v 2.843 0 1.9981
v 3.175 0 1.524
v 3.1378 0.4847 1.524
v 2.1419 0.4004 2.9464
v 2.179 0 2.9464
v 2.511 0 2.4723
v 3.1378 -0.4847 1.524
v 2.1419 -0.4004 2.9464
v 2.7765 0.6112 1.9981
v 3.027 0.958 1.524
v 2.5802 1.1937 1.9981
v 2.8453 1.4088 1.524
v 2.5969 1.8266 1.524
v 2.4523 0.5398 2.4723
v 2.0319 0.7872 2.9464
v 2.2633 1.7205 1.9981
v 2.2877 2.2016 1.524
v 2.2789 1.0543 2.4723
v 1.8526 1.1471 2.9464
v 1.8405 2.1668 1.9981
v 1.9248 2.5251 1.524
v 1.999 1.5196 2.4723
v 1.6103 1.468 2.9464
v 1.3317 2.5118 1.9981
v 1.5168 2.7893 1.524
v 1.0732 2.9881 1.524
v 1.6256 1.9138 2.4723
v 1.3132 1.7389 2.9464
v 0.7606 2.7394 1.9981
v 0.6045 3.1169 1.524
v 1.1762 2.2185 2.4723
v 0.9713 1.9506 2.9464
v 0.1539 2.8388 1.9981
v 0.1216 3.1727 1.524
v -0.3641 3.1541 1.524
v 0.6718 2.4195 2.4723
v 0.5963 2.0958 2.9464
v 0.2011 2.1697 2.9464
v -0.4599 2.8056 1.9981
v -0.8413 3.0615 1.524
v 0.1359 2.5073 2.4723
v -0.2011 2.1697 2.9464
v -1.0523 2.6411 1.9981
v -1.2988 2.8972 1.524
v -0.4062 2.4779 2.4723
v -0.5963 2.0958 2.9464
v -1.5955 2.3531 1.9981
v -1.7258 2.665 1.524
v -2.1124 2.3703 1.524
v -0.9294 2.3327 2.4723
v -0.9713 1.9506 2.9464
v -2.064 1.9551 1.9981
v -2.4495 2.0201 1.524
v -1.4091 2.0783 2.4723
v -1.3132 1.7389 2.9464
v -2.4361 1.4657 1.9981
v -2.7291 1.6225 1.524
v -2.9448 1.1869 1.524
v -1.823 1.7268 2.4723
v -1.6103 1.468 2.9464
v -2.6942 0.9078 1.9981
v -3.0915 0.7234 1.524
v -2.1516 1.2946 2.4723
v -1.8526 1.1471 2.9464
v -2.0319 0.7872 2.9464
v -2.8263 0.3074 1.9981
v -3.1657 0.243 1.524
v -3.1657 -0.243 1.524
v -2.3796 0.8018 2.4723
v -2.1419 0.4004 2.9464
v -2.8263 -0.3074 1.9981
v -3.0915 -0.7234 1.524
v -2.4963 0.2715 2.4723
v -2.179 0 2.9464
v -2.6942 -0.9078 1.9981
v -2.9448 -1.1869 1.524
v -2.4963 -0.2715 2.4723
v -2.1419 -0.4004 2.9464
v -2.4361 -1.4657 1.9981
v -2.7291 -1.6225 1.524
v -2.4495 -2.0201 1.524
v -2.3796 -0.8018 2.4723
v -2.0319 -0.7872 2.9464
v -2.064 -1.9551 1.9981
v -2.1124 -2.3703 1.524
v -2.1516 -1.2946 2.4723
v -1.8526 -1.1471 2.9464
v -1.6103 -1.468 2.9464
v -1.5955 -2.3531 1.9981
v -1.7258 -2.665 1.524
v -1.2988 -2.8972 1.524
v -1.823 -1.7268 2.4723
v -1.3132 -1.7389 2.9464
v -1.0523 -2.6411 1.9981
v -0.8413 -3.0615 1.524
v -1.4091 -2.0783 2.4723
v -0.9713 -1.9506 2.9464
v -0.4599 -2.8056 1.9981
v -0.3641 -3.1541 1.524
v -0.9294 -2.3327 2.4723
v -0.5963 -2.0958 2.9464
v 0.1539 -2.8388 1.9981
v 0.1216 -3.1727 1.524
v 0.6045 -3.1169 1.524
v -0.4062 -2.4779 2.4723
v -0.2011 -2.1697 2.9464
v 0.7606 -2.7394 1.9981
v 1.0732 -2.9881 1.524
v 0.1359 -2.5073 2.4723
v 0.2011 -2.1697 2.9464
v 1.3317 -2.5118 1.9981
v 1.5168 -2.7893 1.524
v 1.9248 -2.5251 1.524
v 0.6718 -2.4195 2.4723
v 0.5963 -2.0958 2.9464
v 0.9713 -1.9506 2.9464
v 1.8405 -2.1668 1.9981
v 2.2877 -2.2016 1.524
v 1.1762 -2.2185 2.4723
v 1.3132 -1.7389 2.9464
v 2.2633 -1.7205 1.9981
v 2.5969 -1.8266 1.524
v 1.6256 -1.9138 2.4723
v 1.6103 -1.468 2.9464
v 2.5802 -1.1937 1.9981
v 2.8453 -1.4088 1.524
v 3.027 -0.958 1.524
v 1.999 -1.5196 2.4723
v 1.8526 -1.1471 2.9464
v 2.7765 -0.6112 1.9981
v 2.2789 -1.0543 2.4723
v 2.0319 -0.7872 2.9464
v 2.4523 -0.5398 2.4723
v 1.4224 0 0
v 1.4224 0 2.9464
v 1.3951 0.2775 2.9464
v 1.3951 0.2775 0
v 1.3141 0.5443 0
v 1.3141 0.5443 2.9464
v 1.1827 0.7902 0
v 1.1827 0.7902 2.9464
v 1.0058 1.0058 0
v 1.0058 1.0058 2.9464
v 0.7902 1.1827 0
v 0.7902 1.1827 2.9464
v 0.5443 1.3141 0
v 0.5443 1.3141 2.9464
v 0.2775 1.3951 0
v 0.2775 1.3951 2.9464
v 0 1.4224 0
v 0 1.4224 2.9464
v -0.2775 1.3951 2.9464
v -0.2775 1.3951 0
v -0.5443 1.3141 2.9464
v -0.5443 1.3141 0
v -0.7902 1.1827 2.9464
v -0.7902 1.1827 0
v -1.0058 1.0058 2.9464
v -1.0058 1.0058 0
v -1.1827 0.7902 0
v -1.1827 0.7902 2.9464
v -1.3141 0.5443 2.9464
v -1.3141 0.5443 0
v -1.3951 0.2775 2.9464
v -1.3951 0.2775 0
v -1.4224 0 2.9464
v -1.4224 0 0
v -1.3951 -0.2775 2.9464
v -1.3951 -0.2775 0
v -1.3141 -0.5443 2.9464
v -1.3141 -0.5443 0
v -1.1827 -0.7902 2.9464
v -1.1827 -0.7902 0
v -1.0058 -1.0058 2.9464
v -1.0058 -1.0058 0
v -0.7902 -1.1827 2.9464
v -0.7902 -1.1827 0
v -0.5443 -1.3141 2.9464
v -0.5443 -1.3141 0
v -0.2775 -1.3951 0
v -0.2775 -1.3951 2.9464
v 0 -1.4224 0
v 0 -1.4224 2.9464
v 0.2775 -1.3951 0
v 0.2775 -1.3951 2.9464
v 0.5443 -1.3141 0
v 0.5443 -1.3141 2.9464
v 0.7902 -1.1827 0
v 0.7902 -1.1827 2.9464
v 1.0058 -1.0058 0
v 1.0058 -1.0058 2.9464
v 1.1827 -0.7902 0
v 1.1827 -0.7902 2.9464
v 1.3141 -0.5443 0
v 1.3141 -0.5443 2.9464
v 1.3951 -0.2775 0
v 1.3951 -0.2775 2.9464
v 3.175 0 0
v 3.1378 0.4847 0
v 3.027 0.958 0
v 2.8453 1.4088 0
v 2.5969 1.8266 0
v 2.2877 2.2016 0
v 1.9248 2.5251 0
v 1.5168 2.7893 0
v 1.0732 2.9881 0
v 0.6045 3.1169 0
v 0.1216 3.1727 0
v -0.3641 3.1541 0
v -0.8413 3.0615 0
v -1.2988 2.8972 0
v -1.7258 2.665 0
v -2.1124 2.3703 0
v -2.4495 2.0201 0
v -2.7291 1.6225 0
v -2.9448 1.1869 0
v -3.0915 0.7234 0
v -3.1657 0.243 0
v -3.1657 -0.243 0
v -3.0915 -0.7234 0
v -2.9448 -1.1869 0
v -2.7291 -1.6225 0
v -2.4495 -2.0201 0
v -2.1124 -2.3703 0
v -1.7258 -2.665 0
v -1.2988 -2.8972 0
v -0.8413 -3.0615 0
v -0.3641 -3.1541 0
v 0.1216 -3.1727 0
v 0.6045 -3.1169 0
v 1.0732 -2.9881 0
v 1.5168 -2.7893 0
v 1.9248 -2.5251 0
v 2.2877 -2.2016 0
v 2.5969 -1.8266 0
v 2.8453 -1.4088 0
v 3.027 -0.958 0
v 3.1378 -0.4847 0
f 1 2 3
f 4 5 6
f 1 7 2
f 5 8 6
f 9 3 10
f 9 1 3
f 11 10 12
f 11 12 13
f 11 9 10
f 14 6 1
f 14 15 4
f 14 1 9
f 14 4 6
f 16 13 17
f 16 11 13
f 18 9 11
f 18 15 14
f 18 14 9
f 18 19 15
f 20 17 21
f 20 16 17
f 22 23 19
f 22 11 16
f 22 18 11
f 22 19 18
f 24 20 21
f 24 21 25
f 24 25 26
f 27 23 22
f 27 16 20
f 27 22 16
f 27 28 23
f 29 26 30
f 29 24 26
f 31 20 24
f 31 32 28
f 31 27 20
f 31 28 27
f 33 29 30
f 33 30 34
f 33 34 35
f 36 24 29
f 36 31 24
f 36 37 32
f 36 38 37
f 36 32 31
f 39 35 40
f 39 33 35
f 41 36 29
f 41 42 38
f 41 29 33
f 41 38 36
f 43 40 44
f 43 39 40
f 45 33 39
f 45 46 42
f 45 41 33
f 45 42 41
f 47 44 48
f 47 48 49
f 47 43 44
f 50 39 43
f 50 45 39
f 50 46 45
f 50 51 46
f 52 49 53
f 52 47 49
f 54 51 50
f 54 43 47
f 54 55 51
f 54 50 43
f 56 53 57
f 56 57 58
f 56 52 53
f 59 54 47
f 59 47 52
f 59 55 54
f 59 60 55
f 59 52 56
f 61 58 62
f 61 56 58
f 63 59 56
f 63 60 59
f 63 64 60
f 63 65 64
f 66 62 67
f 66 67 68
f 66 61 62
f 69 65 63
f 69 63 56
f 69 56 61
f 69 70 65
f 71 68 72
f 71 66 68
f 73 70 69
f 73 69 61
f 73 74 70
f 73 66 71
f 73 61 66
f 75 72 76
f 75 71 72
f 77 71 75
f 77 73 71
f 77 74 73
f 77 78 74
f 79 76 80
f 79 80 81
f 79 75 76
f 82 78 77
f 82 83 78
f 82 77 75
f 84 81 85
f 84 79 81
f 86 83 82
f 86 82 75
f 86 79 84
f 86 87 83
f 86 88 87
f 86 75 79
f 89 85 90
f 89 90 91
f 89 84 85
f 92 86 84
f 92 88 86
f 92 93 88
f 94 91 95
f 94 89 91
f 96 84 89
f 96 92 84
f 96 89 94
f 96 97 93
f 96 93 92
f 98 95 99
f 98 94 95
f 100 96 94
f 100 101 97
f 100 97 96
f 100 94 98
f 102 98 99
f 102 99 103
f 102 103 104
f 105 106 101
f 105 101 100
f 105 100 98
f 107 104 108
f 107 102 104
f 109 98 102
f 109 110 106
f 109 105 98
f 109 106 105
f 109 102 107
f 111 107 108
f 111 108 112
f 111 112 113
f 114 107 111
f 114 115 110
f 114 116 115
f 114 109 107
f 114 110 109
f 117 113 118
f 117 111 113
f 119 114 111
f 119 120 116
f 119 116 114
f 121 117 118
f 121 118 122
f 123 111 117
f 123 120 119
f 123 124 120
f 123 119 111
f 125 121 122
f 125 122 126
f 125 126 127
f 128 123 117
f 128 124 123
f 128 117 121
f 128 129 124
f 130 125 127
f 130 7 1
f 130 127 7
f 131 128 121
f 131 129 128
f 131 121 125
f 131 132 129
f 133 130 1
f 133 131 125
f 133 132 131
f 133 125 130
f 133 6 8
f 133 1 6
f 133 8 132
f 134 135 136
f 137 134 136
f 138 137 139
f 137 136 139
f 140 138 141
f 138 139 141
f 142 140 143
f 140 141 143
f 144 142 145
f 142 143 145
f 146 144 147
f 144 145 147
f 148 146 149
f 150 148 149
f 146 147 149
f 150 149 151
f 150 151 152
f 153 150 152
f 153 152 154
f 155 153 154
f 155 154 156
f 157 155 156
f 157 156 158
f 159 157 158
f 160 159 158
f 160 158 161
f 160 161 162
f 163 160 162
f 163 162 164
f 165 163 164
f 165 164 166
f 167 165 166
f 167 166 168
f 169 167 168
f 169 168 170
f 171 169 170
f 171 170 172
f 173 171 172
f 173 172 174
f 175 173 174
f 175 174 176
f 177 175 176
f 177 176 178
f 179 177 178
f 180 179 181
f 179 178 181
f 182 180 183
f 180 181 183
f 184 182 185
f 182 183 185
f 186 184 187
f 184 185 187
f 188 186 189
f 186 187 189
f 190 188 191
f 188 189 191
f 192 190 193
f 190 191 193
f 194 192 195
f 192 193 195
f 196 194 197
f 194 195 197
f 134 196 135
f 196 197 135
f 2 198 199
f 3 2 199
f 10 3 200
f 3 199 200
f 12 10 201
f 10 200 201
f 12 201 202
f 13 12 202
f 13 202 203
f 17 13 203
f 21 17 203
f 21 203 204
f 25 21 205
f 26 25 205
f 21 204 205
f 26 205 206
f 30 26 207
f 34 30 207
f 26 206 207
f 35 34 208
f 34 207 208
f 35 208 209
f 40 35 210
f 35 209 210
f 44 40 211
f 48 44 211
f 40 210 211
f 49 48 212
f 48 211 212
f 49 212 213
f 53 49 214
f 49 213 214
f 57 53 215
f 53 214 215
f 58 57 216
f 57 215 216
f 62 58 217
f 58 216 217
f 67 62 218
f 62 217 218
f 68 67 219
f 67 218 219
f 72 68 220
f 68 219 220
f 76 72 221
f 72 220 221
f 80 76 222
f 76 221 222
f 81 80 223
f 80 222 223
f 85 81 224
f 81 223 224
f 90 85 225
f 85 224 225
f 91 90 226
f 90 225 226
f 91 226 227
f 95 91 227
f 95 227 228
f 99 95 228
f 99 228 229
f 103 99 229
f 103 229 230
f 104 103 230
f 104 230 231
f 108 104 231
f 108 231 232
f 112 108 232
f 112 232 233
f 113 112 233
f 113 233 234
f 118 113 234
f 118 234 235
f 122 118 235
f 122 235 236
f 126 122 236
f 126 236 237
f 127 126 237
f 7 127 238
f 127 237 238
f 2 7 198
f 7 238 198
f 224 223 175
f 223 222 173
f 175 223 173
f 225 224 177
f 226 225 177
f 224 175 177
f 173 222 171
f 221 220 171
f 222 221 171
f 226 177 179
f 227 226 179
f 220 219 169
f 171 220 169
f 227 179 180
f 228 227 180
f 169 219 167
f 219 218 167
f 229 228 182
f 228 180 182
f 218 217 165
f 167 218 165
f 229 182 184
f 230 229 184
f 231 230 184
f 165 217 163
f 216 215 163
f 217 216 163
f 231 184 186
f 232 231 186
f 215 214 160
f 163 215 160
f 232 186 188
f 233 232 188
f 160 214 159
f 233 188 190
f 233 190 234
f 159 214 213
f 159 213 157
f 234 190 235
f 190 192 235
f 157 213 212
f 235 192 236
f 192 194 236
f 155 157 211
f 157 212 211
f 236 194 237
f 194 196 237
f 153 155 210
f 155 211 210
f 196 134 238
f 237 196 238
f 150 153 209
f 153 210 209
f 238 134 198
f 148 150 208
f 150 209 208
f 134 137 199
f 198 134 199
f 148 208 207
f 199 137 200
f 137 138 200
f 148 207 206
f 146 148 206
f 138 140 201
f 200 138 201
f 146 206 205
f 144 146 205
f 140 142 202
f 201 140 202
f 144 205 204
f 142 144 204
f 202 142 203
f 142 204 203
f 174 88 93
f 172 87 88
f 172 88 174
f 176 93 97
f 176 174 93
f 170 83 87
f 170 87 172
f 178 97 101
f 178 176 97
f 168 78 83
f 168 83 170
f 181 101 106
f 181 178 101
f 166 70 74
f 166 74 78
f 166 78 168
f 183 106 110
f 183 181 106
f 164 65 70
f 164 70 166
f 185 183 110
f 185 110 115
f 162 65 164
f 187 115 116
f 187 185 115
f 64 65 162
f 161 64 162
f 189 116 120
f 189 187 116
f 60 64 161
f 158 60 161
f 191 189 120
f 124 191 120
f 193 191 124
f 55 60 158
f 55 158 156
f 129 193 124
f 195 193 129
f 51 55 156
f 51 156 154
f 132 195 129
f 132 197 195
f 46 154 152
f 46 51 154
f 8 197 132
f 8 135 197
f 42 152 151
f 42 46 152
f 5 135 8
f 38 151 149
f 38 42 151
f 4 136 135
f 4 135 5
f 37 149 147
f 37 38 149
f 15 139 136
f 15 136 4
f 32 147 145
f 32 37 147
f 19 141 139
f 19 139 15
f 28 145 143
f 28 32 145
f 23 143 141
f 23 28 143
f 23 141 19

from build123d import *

# Parameters (mm, degrees)
SKETCH1_R      = 3.175
EXTRUDE1_DEPTH = 2.9464
SKETCH2_R      = 1.4224
EXTRUDE2_DEPTH = 3.9464
CHAMFER1_SIZE  = 1.4224
CHAMFER1_SIZE2 = 0.995975202


with BuildPart() as part:
    # Sketch1 → Extrude1 (new body)
    with BuildSketch(Plane.XY):
        Circle(SKETCH1_R)
    extrude(amount=EXTRUDE1_DEPTH)

    # Sketch2 → Extrude2 (cut, through all)
    with BuildSketch(Plane.XY.offset(2.9464)):
        Circle(SKETCH2_R)
    extrude(amount=-EXTRUDE2_DEPTH, mode=Mode.SUBTRACT)

    # Chamfer1
    chamfer1_edges = [part.edges().sort_by_distance(p)[0] for p in [
        (-3.175, 0, 2.9464),
    ]]
    chamfer1_side = [part.faces().sort_by_distance(p)[0] for p in [
        (-3.175, 0, 1.4732),
    ]]
    chamfer(chamfer1_edges, length=CHAMFER1_SIZE, length2=CHAMFER1_SIZE2, reference=chamfer1_side[0])


solid = part.part
